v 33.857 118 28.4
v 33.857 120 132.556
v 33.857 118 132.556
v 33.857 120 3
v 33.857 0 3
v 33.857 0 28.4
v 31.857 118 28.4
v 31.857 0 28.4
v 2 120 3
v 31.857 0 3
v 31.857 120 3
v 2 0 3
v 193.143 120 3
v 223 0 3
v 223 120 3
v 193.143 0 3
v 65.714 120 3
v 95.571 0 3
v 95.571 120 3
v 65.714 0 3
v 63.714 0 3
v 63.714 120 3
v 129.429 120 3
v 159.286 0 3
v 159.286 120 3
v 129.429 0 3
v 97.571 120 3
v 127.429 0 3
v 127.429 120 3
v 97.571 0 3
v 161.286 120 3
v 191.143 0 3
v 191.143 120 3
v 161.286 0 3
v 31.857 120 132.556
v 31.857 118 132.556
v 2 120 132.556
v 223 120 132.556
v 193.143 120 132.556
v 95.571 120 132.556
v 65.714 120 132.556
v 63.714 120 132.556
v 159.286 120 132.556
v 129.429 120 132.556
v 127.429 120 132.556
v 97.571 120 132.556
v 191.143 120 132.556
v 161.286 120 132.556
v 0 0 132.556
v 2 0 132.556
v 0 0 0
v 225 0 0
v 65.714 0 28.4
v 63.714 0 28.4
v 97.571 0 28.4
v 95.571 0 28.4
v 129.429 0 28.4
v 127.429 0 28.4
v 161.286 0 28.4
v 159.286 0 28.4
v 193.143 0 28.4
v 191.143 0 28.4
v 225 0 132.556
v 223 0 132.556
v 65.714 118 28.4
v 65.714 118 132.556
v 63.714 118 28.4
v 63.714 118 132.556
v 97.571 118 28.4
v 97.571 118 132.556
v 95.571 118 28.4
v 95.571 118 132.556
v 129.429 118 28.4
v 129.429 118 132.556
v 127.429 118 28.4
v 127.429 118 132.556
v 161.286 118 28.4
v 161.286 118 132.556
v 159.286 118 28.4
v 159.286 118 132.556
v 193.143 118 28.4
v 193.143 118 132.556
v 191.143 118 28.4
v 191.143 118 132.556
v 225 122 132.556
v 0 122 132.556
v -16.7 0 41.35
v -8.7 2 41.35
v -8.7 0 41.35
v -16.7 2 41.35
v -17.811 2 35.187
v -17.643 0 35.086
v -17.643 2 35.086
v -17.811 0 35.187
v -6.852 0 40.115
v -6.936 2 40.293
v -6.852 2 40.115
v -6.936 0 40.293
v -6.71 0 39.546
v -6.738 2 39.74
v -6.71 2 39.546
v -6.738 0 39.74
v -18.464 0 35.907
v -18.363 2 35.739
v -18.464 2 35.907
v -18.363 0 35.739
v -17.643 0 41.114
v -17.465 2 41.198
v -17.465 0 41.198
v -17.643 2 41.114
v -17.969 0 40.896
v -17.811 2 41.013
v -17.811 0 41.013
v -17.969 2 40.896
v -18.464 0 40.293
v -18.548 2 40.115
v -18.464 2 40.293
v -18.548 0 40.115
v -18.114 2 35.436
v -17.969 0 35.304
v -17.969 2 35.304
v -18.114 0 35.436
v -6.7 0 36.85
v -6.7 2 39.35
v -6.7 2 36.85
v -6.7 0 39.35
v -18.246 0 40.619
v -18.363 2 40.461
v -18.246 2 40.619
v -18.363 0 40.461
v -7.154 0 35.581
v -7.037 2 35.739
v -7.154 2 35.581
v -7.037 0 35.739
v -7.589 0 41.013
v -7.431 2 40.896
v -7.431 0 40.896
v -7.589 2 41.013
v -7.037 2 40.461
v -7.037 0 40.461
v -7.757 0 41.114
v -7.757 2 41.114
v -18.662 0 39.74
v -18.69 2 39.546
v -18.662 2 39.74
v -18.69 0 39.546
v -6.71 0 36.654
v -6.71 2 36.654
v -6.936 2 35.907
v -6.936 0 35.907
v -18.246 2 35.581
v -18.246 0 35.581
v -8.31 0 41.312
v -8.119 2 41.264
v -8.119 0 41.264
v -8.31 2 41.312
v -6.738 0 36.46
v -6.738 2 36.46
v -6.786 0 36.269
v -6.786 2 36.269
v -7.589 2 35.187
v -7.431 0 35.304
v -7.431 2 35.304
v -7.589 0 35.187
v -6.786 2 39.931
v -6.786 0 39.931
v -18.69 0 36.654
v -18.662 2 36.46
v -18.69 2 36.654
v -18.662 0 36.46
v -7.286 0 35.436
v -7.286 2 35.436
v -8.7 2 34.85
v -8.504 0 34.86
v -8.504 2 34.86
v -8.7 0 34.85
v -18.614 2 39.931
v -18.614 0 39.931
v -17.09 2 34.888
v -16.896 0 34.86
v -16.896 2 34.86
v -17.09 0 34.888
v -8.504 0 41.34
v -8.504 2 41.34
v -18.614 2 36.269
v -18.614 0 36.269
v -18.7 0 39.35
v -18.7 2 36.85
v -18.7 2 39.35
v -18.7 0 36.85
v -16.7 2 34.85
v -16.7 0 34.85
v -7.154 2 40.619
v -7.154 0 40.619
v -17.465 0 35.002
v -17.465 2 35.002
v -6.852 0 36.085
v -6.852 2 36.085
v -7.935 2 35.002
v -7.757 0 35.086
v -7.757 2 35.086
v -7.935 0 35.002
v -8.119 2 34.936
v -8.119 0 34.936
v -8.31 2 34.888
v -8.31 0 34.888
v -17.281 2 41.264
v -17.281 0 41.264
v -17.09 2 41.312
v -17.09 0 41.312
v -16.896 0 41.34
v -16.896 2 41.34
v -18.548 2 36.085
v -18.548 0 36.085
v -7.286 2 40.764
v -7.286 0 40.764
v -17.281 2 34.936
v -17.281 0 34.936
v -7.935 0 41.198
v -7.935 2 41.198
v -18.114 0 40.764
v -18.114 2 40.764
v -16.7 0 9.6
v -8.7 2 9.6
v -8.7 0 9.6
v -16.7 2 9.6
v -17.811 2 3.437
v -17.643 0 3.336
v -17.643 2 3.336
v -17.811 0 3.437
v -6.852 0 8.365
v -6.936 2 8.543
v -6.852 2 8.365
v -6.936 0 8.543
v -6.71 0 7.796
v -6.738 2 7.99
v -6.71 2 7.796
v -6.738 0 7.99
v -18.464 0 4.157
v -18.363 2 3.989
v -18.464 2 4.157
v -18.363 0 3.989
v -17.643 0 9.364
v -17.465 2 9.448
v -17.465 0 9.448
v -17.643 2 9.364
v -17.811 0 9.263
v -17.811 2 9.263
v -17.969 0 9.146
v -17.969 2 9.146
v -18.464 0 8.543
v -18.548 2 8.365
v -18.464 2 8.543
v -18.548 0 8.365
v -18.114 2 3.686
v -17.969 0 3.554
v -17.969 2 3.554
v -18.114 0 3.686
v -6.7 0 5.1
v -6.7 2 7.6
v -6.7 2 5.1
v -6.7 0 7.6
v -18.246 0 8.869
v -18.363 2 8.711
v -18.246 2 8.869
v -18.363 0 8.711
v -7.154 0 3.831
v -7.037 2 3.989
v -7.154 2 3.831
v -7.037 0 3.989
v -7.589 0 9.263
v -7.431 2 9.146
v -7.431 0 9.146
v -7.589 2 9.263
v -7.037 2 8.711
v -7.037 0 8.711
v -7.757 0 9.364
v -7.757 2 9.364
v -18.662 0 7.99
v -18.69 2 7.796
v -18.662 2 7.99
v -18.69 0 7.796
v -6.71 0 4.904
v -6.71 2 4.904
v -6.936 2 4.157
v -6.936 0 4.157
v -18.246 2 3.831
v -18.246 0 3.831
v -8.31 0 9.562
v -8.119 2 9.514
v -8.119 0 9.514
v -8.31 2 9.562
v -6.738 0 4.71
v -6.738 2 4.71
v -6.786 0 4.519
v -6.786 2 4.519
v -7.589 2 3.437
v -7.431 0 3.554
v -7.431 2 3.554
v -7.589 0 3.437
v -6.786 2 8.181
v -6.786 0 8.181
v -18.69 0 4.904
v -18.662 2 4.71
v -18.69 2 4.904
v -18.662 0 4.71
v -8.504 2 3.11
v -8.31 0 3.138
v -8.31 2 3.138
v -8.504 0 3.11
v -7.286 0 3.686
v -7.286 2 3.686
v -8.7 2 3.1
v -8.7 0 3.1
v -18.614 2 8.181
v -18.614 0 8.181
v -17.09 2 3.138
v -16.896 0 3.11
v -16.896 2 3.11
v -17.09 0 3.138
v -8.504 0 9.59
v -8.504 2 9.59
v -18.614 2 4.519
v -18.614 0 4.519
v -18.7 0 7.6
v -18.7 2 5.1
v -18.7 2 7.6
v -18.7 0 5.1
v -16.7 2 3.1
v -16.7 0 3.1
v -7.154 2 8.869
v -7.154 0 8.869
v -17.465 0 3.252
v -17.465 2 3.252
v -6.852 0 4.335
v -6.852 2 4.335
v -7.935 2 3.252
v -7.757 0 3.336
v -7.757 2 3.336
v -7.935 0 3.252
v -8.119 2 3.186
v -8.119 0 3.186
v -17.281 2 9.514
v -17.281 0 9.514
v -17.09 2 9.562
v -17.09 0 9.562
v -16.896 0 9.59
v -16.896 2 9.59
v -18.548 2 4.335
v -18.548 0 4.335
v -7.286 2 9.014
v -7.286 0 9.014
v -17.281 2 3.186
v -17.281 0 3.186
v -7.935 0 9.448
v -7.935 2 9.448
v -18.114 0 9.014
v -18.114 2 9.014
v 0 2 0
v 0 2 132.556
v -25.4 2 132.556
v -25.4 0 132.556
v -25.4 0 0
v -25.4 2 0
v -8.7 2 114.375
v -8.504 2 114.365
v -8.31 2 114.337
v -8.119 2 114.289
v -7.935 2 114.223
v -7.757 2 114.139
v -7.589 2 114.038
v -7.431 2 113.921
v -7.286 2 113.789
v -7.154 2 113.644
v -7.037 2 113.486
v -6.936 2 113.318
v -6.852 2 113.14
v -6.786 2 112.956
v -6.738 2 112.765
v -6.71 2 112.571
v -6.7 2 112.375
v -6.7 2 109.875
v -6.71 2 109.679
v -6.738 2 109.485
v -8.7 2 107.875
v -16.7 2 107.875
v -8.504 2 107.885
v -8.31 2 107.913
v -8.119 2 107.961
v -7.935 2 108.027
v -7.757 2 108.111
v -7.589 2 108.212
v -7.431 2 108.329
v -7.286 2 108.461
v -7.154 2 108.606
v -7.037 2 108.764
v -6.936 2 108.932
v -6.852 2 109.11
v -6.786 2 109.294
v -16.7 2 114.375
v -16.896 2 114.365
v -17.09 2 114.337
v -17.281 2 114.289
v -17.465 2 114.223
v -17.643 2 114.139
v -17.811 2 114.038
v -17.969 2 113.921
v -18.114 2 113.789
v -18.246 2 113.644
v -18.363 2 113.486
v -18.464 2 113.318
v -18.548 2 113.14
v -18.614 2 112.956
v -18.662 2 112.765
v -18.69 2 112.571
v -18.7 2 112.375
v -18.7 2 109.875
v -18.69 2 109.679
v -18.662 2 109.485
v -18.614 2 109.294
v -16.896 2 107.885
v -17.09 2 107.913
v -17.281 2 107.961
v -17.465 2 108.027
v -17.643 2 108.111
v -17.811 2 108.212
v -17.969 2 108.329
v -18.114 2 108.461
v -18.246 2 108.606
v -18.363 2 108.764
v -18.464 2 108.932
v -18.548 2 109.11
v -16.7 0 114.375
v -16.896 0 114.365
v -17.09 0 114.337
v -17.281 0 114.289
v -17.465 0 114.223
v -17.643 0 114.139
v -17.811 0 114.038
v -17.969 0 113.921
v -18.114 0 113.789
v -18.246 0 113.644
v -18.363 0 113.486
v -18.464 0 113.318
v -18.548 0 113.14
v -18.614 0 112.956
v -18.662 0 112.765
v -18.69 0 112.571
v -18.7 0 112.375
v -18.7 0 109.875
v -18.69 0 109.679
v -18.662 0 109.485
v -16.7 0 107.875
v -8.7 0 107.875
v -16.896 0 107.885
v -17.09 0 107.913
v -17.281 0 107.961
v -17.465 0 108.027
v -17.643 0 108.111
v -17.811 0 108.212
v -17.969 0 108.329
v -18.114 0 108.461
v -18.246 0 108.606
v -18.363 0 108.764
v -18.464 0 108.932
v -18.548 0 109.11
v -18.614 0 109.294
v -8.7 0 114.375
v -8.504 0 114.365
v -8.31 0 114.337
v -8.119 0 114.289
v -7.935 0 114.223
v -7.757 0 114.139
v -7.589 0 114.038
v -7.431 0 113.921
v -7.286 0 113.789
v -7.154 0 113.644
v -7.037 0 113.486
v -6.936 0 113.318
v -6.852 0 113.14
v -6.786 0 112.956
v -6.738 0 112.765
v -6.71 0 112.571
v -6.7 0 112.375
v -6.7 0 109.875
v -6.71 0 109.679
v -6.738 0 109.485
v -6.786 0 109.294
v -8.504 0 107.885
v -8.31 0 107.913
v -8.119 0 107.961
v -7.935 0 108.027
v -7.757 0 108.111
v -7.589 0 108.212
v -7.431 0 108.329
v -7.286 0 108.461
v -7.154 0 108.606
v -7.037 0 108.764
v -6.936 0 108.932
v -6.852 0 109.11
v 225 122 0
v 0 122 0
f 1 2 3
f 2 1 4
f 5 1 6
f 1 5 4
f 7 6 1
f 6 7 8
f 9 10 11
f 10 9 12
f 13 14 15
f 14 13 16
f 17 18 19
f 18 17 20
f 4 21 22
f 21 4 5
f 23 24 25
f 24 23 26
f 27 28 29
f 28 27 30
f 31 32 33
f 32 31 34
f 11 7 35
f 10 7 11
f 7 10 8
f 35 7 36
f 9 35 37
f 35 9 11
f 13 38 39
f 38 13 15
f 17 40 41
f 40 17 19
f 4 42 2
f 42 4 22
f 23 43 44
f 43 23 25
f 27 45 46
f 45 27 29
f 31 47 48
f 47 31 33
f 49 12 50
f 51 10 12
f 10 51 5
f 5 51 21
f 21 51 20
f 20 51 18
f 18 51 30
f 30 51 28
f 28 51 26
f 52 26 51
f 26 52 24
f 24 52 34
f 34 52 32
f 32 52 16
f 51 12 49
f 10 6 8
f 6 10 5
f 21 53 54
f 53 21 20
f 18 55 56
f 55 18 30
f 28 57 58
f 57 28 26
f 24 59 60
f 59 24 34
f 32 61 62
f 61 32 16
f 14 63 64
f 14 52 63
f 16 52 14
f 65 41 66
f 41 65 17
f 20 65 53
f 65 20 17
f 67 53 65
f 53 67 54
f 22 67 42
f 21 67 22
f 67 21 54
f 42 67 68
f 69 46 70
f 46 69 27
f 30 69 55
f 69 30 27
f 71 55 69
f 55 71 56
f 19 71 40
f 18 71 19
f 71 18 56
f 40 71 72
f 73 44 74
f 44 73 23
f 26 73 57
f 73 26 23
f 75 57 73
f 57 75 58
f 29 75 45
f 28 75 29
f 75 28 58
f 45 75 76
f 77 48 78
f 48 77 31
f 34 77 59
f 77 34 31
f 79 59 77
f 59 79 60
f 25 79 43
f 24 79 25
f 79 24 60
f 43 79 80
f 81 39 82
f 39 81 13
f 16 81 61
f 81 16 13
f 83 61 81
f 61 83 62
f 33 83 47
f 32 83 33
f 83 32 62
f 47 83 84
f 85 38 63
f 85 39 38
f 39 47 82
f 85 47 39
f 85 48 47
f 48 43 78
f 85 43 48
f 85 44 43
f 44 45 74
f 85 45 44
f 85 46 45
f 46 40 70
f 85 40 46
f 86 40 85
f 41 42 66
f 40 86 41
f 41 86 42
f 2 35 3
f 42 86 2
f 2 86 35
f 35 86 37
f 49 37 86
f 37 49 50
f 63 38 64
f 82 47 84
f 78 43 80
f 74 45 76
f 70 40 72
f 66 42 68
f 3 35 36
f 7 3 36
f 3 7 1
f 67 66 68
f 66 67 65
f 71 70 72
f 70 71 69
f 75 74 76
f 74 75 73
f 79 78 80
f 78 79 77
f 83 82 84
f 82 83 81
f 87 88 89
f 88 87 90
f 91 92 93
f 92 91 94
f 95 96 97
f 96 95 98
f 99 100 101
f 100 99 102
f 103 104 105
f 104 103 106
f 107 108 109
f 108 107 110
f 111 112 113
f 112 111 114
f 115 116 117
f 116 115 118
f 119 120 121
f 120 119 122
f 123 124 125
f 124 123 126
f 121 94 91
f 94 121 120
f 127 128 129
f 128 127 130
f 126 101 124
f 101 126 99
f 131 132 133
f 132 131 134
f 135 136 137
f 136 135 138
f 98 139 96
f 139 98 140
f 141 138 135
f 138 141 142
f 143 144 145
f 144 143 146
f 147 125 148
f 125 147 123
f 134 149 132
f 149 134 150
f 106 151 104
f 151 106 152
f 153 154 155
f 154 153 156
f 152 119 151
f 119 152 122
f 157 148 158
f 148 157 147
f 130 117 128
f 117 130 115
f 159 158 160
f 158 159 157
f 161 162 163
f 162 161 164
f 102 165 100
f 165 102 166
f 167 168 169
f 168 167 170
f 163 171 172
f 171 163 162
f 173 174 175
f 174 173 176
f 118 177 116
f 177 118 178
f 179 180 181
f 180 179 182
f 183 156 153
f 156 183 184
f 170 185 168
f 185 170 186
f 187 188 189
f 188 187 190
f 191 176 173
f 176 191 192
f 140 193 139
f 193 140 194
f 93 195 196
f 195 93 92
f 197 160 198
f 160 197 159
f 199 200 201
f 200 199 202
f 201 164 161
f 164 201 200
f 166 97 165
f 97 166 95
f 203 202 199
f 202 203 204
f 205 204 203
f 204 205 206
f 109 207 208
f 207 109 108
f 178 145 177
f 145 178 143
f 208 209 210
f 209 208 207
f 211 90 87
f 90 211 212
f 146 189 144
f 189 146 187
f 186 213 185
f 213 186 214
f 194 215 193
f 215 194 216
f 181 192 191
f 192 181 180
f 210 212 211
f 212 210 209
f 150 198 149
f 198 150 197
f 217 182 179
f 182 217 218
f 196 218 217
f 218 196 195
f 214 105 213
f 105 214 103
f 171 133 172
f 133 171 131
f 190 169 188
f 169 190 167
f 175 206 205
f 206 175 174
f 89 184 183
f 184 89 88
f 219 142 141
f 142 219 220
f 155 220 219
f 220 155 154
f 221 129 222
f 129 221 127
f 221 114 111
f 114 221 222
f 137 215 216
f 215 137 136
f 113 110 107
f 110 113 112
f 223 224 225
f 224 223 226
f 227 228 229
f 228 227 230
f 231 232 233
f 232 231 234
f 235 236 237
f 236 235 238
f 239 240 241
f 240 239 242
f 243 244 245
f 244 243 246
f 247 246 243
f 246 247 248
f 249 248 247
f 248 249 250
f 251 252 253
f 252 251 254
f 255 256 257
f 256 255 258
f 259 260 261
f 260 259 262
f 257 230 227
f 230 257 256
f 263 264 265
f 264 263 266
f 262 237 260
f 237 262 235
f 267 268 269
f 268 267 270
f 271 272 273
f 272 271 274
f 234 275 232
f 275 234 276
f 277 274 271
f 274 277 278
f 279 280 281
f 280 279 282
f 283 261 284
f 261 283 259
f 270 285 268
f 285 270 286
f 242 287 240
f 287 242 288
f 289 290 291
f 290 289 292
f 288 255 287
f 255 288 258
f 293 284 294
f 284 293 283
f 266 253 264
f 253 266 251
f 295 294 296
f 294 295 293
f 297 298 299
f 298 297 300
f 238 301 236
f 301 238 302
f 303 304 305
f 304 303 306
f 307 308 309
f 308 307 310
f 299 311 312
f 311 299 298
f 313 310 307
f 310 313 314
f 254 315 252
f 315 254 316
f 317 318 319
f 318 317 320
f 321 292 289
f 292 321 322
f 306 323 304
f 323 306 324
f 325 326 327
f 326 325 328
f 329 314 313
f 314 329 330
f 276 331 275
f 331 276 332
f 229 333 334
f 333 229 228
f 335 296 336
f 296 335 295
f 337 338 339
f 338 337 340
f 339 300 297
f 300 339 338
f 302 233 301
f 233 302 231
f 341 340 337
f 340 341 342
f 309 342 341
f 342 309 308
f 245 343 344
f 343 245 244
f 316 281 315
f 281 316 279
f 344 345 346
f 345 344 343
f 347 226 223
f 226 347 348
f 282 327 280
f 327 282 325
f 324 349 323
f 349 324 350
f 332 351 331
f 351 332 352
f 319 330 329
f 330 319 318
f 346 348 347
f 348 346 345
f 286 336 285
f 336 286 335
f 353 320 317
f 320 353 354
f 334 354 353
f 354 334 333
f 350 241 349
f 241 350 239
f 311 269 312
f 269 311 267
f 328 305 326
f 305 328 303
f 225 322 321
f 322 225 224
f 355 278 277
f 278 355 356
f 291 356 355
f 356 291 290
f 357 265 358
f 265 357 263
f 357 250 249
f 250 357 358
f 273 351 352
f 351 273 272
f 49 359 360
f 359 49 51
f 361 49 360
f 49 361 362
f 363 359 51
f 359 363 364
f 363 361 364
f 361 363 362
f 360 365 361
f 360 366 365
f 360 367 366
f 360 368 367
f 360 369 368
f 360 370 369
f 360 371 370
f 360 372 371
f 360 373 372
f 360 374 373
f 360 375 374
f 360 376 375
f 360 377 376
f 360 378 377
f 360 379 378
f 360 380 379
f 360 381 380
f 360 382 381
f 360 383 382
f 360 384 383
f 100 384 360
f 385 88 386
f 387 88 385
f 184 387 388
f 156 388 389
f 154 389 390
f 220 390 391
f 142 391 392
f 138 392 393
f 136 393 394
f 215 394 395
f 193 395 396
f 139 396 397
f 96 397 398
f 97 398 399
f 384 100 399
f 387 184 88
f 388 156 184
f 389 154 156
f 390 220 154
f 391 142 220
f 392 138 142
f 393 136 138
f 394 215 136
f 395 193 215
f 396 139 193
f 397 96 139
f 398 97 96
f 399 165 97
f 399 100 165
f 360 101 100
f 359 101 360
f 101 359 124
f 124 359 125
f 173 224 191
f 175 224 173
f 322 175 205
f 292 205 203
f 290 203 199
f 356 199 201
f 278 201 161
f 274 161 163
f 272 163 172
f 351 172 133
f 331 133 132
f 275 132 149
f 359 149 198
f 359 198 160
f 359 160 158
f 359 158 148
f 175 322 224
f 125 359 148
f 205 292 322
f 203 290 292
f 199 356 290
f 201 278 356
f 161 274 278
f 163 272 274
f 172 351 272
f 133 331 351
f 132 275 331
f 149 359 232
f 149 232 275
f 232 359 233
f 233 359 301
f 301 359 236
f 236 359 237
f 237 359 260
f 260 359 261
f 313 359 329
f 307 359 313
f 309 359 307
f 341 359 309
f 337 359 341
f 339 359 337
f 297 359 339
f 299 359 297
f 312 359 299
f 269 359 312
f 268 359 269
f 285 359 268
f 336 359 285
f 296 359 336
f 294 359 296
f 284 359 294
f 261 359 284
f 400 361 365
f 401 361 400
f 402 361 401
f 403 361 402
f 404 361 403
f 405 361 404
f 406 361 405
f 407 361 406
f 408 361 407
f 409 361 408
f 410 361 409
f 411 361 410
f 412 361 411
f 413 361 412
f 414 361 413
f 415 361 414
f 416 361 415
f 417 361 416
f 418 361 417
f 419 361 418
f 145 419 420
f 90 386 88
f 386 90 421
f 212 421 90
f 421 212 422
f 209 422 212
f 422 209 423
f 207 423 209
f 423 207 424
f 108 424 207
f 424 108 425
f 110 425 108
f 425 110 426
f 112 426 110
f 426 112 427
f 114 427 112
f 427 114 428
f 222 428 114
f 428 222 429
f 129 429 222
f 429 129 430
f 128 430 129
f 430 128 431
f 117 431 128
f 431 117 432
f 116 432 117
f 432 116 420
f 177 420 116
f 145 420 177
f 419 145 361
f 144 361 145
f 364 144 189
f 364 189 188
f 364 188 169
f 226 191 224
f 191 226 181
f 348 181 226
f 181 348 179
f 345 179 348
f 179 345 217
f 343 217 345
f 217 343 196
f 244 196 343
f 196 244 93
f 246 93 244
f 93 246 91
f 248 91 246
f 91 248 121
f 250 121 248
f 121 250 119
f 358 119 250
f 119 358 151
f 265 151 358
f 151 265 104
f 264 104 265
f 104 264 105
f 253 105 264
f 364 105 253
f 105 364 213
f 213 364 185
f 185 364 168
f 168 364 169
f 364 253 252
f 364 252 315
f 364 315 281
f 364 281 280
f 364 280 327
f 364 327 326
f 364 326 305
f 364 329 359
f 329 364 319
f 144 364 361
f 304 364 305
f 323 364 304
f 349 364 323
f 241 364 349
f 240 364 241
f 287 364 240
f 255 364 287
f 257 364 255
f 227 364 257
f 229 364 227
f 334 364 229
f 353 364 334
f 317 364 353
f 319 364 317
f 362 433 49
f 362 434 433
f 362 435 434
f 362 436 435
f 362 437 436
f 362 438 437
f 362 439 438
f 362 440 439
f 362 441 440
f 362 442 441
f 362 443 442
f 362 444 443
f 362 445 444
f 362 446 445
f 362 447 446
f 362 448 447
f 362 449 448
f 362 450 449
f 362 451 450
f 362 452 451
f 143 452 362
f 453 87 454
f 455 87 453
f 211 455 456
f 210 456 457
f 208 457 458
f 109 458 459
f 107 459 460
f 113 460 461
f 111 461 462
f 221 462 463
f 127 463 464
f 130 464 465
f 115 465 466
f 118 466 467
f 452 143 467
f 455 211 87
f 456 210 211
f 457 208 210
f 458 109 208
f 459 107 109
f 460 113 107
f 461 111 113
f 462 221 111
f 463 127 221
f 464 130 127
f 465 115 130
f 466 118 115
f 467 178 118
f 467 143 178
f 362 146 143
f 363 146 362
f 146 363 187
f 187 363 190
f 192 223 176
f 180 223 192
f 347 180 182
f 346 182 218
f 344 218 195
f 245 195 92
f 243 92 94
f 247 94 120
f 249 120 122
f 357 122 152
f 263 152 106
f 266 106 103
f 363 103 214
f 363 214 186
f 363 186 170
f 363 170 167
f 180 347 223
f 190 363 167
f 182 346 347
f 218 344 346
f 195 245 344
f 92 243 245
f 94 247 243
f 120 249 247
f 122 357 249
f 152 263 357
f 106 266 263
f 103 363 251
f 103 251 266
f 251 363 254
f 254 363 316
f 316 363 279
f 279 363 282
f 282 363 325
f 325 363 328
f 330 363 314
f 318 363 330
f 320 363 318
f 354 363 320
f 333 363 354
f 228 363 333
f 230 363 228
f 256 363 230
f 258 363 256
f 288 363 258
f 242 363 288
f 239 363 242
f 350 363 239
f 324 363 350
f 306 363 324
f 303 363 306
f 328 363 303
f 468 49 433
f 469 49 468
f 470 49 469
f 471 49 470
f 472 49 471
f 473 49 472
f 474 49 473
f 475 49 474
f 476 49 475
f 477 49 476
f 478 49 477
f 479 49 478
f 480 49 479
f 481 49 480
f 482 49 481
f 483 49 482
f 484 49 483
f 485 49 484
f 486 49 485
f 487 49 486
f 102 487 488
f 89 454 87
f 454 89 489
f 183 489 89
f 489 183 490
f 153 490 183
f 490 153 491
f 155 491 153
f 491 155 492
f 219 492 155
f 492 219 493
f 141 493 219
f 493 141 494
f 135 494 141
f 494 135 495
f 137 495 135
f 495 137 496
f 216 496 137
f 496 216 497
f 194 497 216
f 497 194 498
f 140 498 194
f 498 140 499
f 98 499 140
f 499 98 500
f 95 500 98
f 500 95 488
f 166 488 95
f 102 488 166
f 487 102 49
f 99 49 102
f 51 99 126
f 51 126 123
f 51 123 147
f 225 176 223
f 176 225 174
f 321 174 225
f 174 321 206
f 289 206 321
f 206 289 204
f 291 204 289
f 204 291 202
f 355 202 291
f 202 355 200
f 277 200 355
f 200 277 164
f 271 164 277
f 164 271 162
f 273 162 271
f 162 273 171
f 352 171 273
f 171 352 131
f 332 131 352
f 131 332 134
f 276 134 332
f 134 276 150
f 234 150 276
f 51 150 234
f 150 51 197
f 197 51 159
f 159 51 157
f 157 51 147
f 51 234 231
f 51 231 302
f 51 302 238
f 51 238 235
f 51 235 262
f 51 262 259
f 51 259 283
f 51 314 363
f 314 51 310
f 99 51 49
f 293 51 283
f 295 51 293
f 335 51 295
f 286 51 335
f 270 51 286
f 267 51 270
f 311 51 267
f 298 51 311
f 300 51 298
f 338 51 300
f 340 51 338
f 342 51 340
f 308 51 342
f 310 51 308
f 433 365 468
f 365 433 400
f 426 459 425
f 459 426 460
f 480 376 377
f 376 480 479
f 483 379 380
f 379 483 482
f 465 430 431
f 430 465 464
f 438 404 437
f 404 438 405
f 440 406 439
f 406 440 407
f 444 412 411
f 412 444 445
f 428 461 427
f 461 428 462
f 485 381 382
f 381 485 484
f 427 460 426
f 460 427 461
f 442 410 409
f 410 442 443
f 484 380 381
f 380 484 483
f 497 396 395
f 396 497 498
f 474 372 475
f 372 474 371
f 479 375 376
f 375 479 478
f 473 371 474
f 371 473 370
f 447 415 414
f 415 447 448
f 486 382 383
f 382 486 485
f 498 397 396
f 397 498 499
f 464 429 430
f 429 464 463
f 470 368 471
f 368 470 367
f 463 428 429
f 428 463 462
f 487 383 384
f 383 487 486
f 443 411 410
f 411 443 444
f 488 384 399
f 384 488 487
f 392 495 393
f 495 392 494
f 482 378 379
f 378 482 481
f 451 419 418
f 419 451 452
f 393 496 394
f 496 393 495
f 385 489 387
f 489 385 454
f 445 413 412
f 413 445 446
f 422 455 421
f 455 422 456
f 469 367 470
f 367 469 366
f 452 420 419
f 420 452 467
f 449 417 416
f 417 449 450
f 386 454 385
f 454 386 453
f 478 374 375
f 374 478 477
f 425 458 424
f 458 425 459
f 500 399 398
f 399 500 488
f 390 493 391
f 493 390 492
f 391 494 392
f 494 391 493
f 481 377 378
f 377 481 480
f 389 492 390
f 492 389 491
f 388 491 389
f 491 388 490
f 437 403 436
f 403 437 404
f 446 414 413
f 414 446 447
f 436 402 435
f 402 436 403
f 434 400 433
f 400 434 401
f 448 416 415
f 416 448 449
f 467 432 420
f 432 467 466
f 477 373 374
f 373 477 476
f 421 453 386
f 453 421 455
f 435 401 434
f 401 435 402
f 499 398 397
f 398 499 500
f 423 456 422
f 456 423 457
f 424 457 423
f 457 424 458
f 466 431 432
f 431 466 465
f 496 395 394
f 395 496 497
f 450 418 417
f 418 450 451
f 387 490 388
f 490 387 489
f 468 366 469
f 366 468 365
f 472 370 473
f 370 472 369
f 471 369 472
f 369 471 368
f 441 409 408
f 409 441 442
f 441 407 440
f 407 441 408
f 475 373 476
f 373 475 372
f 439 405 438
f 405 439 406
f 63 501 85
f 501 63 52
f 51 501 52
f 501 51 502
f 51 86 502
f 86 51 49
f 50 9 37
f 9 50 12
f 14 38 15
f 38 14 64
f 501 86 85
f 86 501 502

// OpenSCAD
// file: ../scadlib/rack_mount.scad
/* OpenSCAD Utility Library: Rack Mounted Stuff
 * By Michael Stum
 * https://www.stum.de/
 *
 * This work is licensed under a
 * Creative Commons Attribution-ShareAlike 4.0 International License.
 * https://creativecommons.org/licenses/by-sa/4.0/
 */

use <misc.scad>;

function rack_spacing() = 0.794; // ​1⁄32 inch (0.03125 in or 0.794 mm)
function rack_units(units = 1, apply_spacing = false)
    = apply_spacing
        ? (44.45 * units) - rack_spacing()
        : (44.45 * units);
        
module rack_mounting_ear(units = 1, apply_spacing = true, ear_width = 25.4, ear_strength = 2)
{   
    total_height = rack_units(units, apply_spacing);    
    cube(size = [ear_width, ear_strength, total_height], center = false);
}

module rack_mounting_ear_holes(bottom = true, top = true, middle = true, ear_width = inch_to_mm(1), ear_strength = 2)
{    
    // Assuming an M6 Screw/Bolt
    ear_screwhole_width = 12;
    ear_screwhole_height = 6.5;
    ear_screwhole_height_half = ear_screwhole_height/2;
    ear_screwhole_ypos = -(ear_strength/2);
    
    vpos = (ear_width - ear_screwhole_width) / 2;
    top_pos = (rack_units() - ear_screwhole_height) - (inch_to_mm(0.25) - ear_screwhole_height_half);
    middle_pos = rack_units(0.5) - (ear_screwhole_height/2);
    bottom_pos = inch_to_mm(0.25) - ear_screwhole_height_half;
    
    if (top) {
        translate([vpos,ear_screwhole_ypos,top_pos])
          rounded_cube([ear_screwhole_width, ear_strength*2, ear_screwhole_height]);
    }
    
    if (middle) {
        translate([vpos,ear_screwhole_ypos,middle_pos])
          rounded_cube([ear_screwhole_width, ear_strength*2, ear_screwhole_height]);
    }
    
    if (bottom) {
        translate([vpos,ear_screwhole_ypos,bottom_pos])
          rounded_cube([ear_screwhole_width, ear_strength*2, ear_screwhole_height]);
    }
}
// file: ../scadlib/misc.scad
/* OpenSCAD Utility Library
 * By Michael Stum
 * https://www.stum.de/
 *
 * This work is licensed under a
 * Creative Commons Attribution-ShareAlike 4.0 International License.
 * https://creativecommons.org/licenses/by-sa/4.0/
 */

function inch_to_mm(inch) = inch * 25.4;

module rounded_cube(d,r=2) {
    cube_width = d[0]-(r*2);
    cube_height = d[1];
    cube_depth = d[2]-(r*2);
   
    minkowski() {
        translate([r,0,r]) cube([cube_width, cube_height, cube_depth]);
        
        rotate([90,0,0])
          cylinder(r=r,h=cube_depth,center=true, $fn=64);
    }
}
// main file
/* LTO Tape Holder for 19" (Half-)Rack, 3U, 7 Tapes, mirror-able
 * By Michael Stum
 * https://www.stum.de/
 *
 * This work is licensed under a
 * Creative Commons Attribution-ShareAlike 4.0 International License.
 * https://creativecommons.org/licenses/by-sa/4.0/
 */
 
/* Usage Notes:
 * - You should strengthen the mounting ear and horizontal
 *   area with some piece of metal or wood or similar.
 * - LTO Tapes weigh around 250g/8.8oz each (in their cases).
 *   That's 1.75kg for 7 tapes.
 * - Slot width is meant to hold tapes in their protective cases
 * - Slot width should accomodate wider cases
 * - Can hold RDX Cartridges as well, and smaller
 *   tape formats like AIT, DDS, VXA, ...
 * - Not compatible with DLT/SDLT Tapes in their cases,
 *   Slots are slightly too narrow.
 * - All Units are in Millimeters (mm), unless multiplied with
 *   inch_to_mm, at which point they are in inch (in/")
 */
 
 use <../scadlib/misc.scad>
 use <../scadlib/rack_mount.scad>

// Should the spacers between tapes go all the way to the top?
full_height_walls = false;

// Add a ceiling?
add_ceiling = false;

// Add mounting ears for rack mount? (Set false if put on a desk or if you want to attach your own ear/rail)
add_rack_mount_ear = true;

// Two mirrored pieces (Left and Right) can be combined
// to fill out a 19" Rack. This sets whether we're doing
// the Left (false) or Right (true) side piece
is_right_side_piece = false;

// How thick should the floor be? (mm)
floor_strength = 3;

// How thick should the ceiling be if add_ceiling is true? (mm)
ceiling_strength = 3;

// Draw Tapes (for visualization, set false for STL export)
draw_tapes = false;

// Draw a mirrored second half for full 19" width (for visualization, set false for STL export)
draw_second_half = false;

// How "smooth" screw holes and other rounded parts are.
$fn = 256;

/********************************************
 * The actual drawing code                  *
 * stuff here isn't meant to be customized, *
 * as it may not work correctly.            */
/********************************************/
num_tapes = 7; // Can't change this, other magic numbers assume this
total_height = rack_units(3, apply_spacing = true);

wall_strength = 2;
back_strength = wall_strength;
ear_strength = wall_strength;

floor_width = 225;
floor_depth = 120;
wall_height_full = total_height-floor_strength;
wall_height =  full_height_walls
        ? add_ceiling
            ? wall_height_full-ceiling_strength
            : wall_height_full
        : inch_to_mm(1);

/* LTO Tape in one of those annoying wide cases */
tape_width = 29;
tape_depth = 112;
tape_height = 114;

/* Breathing room on the side of each tape, basically whatever is left after subtracting the tape width and wall width */
tape_box_extra_width = (floor_width - (num_tapes * tape_width) - ((num_tapes+1) * wall_strength)) / num_tapes;
tape_box_width = tape_width + tape_box_extra_width;

module half_rack()
{
    // Floor
    color("LightGreen")
      cube(size = [floor_width, floor_depth, floor_strength], center = false);

    // First Spacer Wall - always full height
    color("Blue")
    translate([0,0,floor_strength])
      cube(size = [wall_strength, floor_depth, wall_height_full], center = false);
    
    // Spacer Walls
    for ( i = [1 : num_tapes-1] ){
        color("DimGray")
        translate([(tape_box_width + wall_strength) * i,0,floor_strength])
          cube(size = [wall_strength, floor_depth, wall_height], center = false);
    }
    
    // Spacer wall back supports
    if (!full_height_walls) {
        for ( i = [1 : num_tapes-1] ){
            color("Yellow")
            translate([(tape_box_width + wall_strength) * i,floor_depth-back_strength,floor_strength + wall_height])
              cube(size = [wall_strength, back_strength, wall_height_full-wall_height], center = false);
        }
    }
    
    // Last Spacer Wall - always full height
    color("Blue")
    translate([(tape_box_width + wall_strength) * num_tapes,0,floor_strength])
      cube(size = [wall_strength, floor_depth, wall_height_full], center = false);

    // Back Wall
    color("Red")
    translate([0,floor_depth,0])
      cube(size = [floor_width, back_strength, total_height], center = false);

    if (add_ceiling) {
        color("Green")
        translate([0,0,total_height-ceiling_strength])
          cube(size = [floor_width, floor_depth, ceiling_strength], center = false);
    }
    
    if (add_rack_mount_ear) {
        color("DarkViolet") mounting_ear();
    }

    // Tapes
    if (draw_tapes) {
        for ( i = [0 : num_tapes-1] ){
            tape_position = ((tape_box_width + wall_strength) * i) + wall_strength + (tape_box_extra_width/2);
            
            color("DeepSkyBlue", 0.7)
            translate([tape_position,0,floor_strength+1])
              cube(size = [tape_width, tape_depth, tape_height], center = false);
        }
    }
}

module mounting_ear()
{
    ear_width = inch_to_mm(1);
    
    translate([-ear_width,0,0]) 
    difference() {            
        rack_mounting_ear(units = 3, ear_width = ear_width, ear_strength = ear_strength);
        
        // Bottom U: Two Holes
        rack_mounting_ear_holes(bottom = true, top = true, middle = false, ear_width = ear_width, ear_strength = ear_strength);
        
        // Top U: Middle Hole
        translate([0,0,rack_units(2)])
            rack_mounting_ear_holes(bottom = false, top = false, middle = true, ear_width = ear_width, ear_strength = ear_strength);
    }
}

mirror_first = is_right_side_piece ? 1 : 0;
mirror_second = is_right_side_piece ? 0 : 1;
translate_second_multi = is_right_side_piece ? -1 : 1;

mirror([mirror_first,0,0]) half_rack();

if (draw_second_half) {
  translate([(floor_width * 2) * translate_second_multi,0,0])
  mirror([mirror_second,0,0])
    half_rack();
}
